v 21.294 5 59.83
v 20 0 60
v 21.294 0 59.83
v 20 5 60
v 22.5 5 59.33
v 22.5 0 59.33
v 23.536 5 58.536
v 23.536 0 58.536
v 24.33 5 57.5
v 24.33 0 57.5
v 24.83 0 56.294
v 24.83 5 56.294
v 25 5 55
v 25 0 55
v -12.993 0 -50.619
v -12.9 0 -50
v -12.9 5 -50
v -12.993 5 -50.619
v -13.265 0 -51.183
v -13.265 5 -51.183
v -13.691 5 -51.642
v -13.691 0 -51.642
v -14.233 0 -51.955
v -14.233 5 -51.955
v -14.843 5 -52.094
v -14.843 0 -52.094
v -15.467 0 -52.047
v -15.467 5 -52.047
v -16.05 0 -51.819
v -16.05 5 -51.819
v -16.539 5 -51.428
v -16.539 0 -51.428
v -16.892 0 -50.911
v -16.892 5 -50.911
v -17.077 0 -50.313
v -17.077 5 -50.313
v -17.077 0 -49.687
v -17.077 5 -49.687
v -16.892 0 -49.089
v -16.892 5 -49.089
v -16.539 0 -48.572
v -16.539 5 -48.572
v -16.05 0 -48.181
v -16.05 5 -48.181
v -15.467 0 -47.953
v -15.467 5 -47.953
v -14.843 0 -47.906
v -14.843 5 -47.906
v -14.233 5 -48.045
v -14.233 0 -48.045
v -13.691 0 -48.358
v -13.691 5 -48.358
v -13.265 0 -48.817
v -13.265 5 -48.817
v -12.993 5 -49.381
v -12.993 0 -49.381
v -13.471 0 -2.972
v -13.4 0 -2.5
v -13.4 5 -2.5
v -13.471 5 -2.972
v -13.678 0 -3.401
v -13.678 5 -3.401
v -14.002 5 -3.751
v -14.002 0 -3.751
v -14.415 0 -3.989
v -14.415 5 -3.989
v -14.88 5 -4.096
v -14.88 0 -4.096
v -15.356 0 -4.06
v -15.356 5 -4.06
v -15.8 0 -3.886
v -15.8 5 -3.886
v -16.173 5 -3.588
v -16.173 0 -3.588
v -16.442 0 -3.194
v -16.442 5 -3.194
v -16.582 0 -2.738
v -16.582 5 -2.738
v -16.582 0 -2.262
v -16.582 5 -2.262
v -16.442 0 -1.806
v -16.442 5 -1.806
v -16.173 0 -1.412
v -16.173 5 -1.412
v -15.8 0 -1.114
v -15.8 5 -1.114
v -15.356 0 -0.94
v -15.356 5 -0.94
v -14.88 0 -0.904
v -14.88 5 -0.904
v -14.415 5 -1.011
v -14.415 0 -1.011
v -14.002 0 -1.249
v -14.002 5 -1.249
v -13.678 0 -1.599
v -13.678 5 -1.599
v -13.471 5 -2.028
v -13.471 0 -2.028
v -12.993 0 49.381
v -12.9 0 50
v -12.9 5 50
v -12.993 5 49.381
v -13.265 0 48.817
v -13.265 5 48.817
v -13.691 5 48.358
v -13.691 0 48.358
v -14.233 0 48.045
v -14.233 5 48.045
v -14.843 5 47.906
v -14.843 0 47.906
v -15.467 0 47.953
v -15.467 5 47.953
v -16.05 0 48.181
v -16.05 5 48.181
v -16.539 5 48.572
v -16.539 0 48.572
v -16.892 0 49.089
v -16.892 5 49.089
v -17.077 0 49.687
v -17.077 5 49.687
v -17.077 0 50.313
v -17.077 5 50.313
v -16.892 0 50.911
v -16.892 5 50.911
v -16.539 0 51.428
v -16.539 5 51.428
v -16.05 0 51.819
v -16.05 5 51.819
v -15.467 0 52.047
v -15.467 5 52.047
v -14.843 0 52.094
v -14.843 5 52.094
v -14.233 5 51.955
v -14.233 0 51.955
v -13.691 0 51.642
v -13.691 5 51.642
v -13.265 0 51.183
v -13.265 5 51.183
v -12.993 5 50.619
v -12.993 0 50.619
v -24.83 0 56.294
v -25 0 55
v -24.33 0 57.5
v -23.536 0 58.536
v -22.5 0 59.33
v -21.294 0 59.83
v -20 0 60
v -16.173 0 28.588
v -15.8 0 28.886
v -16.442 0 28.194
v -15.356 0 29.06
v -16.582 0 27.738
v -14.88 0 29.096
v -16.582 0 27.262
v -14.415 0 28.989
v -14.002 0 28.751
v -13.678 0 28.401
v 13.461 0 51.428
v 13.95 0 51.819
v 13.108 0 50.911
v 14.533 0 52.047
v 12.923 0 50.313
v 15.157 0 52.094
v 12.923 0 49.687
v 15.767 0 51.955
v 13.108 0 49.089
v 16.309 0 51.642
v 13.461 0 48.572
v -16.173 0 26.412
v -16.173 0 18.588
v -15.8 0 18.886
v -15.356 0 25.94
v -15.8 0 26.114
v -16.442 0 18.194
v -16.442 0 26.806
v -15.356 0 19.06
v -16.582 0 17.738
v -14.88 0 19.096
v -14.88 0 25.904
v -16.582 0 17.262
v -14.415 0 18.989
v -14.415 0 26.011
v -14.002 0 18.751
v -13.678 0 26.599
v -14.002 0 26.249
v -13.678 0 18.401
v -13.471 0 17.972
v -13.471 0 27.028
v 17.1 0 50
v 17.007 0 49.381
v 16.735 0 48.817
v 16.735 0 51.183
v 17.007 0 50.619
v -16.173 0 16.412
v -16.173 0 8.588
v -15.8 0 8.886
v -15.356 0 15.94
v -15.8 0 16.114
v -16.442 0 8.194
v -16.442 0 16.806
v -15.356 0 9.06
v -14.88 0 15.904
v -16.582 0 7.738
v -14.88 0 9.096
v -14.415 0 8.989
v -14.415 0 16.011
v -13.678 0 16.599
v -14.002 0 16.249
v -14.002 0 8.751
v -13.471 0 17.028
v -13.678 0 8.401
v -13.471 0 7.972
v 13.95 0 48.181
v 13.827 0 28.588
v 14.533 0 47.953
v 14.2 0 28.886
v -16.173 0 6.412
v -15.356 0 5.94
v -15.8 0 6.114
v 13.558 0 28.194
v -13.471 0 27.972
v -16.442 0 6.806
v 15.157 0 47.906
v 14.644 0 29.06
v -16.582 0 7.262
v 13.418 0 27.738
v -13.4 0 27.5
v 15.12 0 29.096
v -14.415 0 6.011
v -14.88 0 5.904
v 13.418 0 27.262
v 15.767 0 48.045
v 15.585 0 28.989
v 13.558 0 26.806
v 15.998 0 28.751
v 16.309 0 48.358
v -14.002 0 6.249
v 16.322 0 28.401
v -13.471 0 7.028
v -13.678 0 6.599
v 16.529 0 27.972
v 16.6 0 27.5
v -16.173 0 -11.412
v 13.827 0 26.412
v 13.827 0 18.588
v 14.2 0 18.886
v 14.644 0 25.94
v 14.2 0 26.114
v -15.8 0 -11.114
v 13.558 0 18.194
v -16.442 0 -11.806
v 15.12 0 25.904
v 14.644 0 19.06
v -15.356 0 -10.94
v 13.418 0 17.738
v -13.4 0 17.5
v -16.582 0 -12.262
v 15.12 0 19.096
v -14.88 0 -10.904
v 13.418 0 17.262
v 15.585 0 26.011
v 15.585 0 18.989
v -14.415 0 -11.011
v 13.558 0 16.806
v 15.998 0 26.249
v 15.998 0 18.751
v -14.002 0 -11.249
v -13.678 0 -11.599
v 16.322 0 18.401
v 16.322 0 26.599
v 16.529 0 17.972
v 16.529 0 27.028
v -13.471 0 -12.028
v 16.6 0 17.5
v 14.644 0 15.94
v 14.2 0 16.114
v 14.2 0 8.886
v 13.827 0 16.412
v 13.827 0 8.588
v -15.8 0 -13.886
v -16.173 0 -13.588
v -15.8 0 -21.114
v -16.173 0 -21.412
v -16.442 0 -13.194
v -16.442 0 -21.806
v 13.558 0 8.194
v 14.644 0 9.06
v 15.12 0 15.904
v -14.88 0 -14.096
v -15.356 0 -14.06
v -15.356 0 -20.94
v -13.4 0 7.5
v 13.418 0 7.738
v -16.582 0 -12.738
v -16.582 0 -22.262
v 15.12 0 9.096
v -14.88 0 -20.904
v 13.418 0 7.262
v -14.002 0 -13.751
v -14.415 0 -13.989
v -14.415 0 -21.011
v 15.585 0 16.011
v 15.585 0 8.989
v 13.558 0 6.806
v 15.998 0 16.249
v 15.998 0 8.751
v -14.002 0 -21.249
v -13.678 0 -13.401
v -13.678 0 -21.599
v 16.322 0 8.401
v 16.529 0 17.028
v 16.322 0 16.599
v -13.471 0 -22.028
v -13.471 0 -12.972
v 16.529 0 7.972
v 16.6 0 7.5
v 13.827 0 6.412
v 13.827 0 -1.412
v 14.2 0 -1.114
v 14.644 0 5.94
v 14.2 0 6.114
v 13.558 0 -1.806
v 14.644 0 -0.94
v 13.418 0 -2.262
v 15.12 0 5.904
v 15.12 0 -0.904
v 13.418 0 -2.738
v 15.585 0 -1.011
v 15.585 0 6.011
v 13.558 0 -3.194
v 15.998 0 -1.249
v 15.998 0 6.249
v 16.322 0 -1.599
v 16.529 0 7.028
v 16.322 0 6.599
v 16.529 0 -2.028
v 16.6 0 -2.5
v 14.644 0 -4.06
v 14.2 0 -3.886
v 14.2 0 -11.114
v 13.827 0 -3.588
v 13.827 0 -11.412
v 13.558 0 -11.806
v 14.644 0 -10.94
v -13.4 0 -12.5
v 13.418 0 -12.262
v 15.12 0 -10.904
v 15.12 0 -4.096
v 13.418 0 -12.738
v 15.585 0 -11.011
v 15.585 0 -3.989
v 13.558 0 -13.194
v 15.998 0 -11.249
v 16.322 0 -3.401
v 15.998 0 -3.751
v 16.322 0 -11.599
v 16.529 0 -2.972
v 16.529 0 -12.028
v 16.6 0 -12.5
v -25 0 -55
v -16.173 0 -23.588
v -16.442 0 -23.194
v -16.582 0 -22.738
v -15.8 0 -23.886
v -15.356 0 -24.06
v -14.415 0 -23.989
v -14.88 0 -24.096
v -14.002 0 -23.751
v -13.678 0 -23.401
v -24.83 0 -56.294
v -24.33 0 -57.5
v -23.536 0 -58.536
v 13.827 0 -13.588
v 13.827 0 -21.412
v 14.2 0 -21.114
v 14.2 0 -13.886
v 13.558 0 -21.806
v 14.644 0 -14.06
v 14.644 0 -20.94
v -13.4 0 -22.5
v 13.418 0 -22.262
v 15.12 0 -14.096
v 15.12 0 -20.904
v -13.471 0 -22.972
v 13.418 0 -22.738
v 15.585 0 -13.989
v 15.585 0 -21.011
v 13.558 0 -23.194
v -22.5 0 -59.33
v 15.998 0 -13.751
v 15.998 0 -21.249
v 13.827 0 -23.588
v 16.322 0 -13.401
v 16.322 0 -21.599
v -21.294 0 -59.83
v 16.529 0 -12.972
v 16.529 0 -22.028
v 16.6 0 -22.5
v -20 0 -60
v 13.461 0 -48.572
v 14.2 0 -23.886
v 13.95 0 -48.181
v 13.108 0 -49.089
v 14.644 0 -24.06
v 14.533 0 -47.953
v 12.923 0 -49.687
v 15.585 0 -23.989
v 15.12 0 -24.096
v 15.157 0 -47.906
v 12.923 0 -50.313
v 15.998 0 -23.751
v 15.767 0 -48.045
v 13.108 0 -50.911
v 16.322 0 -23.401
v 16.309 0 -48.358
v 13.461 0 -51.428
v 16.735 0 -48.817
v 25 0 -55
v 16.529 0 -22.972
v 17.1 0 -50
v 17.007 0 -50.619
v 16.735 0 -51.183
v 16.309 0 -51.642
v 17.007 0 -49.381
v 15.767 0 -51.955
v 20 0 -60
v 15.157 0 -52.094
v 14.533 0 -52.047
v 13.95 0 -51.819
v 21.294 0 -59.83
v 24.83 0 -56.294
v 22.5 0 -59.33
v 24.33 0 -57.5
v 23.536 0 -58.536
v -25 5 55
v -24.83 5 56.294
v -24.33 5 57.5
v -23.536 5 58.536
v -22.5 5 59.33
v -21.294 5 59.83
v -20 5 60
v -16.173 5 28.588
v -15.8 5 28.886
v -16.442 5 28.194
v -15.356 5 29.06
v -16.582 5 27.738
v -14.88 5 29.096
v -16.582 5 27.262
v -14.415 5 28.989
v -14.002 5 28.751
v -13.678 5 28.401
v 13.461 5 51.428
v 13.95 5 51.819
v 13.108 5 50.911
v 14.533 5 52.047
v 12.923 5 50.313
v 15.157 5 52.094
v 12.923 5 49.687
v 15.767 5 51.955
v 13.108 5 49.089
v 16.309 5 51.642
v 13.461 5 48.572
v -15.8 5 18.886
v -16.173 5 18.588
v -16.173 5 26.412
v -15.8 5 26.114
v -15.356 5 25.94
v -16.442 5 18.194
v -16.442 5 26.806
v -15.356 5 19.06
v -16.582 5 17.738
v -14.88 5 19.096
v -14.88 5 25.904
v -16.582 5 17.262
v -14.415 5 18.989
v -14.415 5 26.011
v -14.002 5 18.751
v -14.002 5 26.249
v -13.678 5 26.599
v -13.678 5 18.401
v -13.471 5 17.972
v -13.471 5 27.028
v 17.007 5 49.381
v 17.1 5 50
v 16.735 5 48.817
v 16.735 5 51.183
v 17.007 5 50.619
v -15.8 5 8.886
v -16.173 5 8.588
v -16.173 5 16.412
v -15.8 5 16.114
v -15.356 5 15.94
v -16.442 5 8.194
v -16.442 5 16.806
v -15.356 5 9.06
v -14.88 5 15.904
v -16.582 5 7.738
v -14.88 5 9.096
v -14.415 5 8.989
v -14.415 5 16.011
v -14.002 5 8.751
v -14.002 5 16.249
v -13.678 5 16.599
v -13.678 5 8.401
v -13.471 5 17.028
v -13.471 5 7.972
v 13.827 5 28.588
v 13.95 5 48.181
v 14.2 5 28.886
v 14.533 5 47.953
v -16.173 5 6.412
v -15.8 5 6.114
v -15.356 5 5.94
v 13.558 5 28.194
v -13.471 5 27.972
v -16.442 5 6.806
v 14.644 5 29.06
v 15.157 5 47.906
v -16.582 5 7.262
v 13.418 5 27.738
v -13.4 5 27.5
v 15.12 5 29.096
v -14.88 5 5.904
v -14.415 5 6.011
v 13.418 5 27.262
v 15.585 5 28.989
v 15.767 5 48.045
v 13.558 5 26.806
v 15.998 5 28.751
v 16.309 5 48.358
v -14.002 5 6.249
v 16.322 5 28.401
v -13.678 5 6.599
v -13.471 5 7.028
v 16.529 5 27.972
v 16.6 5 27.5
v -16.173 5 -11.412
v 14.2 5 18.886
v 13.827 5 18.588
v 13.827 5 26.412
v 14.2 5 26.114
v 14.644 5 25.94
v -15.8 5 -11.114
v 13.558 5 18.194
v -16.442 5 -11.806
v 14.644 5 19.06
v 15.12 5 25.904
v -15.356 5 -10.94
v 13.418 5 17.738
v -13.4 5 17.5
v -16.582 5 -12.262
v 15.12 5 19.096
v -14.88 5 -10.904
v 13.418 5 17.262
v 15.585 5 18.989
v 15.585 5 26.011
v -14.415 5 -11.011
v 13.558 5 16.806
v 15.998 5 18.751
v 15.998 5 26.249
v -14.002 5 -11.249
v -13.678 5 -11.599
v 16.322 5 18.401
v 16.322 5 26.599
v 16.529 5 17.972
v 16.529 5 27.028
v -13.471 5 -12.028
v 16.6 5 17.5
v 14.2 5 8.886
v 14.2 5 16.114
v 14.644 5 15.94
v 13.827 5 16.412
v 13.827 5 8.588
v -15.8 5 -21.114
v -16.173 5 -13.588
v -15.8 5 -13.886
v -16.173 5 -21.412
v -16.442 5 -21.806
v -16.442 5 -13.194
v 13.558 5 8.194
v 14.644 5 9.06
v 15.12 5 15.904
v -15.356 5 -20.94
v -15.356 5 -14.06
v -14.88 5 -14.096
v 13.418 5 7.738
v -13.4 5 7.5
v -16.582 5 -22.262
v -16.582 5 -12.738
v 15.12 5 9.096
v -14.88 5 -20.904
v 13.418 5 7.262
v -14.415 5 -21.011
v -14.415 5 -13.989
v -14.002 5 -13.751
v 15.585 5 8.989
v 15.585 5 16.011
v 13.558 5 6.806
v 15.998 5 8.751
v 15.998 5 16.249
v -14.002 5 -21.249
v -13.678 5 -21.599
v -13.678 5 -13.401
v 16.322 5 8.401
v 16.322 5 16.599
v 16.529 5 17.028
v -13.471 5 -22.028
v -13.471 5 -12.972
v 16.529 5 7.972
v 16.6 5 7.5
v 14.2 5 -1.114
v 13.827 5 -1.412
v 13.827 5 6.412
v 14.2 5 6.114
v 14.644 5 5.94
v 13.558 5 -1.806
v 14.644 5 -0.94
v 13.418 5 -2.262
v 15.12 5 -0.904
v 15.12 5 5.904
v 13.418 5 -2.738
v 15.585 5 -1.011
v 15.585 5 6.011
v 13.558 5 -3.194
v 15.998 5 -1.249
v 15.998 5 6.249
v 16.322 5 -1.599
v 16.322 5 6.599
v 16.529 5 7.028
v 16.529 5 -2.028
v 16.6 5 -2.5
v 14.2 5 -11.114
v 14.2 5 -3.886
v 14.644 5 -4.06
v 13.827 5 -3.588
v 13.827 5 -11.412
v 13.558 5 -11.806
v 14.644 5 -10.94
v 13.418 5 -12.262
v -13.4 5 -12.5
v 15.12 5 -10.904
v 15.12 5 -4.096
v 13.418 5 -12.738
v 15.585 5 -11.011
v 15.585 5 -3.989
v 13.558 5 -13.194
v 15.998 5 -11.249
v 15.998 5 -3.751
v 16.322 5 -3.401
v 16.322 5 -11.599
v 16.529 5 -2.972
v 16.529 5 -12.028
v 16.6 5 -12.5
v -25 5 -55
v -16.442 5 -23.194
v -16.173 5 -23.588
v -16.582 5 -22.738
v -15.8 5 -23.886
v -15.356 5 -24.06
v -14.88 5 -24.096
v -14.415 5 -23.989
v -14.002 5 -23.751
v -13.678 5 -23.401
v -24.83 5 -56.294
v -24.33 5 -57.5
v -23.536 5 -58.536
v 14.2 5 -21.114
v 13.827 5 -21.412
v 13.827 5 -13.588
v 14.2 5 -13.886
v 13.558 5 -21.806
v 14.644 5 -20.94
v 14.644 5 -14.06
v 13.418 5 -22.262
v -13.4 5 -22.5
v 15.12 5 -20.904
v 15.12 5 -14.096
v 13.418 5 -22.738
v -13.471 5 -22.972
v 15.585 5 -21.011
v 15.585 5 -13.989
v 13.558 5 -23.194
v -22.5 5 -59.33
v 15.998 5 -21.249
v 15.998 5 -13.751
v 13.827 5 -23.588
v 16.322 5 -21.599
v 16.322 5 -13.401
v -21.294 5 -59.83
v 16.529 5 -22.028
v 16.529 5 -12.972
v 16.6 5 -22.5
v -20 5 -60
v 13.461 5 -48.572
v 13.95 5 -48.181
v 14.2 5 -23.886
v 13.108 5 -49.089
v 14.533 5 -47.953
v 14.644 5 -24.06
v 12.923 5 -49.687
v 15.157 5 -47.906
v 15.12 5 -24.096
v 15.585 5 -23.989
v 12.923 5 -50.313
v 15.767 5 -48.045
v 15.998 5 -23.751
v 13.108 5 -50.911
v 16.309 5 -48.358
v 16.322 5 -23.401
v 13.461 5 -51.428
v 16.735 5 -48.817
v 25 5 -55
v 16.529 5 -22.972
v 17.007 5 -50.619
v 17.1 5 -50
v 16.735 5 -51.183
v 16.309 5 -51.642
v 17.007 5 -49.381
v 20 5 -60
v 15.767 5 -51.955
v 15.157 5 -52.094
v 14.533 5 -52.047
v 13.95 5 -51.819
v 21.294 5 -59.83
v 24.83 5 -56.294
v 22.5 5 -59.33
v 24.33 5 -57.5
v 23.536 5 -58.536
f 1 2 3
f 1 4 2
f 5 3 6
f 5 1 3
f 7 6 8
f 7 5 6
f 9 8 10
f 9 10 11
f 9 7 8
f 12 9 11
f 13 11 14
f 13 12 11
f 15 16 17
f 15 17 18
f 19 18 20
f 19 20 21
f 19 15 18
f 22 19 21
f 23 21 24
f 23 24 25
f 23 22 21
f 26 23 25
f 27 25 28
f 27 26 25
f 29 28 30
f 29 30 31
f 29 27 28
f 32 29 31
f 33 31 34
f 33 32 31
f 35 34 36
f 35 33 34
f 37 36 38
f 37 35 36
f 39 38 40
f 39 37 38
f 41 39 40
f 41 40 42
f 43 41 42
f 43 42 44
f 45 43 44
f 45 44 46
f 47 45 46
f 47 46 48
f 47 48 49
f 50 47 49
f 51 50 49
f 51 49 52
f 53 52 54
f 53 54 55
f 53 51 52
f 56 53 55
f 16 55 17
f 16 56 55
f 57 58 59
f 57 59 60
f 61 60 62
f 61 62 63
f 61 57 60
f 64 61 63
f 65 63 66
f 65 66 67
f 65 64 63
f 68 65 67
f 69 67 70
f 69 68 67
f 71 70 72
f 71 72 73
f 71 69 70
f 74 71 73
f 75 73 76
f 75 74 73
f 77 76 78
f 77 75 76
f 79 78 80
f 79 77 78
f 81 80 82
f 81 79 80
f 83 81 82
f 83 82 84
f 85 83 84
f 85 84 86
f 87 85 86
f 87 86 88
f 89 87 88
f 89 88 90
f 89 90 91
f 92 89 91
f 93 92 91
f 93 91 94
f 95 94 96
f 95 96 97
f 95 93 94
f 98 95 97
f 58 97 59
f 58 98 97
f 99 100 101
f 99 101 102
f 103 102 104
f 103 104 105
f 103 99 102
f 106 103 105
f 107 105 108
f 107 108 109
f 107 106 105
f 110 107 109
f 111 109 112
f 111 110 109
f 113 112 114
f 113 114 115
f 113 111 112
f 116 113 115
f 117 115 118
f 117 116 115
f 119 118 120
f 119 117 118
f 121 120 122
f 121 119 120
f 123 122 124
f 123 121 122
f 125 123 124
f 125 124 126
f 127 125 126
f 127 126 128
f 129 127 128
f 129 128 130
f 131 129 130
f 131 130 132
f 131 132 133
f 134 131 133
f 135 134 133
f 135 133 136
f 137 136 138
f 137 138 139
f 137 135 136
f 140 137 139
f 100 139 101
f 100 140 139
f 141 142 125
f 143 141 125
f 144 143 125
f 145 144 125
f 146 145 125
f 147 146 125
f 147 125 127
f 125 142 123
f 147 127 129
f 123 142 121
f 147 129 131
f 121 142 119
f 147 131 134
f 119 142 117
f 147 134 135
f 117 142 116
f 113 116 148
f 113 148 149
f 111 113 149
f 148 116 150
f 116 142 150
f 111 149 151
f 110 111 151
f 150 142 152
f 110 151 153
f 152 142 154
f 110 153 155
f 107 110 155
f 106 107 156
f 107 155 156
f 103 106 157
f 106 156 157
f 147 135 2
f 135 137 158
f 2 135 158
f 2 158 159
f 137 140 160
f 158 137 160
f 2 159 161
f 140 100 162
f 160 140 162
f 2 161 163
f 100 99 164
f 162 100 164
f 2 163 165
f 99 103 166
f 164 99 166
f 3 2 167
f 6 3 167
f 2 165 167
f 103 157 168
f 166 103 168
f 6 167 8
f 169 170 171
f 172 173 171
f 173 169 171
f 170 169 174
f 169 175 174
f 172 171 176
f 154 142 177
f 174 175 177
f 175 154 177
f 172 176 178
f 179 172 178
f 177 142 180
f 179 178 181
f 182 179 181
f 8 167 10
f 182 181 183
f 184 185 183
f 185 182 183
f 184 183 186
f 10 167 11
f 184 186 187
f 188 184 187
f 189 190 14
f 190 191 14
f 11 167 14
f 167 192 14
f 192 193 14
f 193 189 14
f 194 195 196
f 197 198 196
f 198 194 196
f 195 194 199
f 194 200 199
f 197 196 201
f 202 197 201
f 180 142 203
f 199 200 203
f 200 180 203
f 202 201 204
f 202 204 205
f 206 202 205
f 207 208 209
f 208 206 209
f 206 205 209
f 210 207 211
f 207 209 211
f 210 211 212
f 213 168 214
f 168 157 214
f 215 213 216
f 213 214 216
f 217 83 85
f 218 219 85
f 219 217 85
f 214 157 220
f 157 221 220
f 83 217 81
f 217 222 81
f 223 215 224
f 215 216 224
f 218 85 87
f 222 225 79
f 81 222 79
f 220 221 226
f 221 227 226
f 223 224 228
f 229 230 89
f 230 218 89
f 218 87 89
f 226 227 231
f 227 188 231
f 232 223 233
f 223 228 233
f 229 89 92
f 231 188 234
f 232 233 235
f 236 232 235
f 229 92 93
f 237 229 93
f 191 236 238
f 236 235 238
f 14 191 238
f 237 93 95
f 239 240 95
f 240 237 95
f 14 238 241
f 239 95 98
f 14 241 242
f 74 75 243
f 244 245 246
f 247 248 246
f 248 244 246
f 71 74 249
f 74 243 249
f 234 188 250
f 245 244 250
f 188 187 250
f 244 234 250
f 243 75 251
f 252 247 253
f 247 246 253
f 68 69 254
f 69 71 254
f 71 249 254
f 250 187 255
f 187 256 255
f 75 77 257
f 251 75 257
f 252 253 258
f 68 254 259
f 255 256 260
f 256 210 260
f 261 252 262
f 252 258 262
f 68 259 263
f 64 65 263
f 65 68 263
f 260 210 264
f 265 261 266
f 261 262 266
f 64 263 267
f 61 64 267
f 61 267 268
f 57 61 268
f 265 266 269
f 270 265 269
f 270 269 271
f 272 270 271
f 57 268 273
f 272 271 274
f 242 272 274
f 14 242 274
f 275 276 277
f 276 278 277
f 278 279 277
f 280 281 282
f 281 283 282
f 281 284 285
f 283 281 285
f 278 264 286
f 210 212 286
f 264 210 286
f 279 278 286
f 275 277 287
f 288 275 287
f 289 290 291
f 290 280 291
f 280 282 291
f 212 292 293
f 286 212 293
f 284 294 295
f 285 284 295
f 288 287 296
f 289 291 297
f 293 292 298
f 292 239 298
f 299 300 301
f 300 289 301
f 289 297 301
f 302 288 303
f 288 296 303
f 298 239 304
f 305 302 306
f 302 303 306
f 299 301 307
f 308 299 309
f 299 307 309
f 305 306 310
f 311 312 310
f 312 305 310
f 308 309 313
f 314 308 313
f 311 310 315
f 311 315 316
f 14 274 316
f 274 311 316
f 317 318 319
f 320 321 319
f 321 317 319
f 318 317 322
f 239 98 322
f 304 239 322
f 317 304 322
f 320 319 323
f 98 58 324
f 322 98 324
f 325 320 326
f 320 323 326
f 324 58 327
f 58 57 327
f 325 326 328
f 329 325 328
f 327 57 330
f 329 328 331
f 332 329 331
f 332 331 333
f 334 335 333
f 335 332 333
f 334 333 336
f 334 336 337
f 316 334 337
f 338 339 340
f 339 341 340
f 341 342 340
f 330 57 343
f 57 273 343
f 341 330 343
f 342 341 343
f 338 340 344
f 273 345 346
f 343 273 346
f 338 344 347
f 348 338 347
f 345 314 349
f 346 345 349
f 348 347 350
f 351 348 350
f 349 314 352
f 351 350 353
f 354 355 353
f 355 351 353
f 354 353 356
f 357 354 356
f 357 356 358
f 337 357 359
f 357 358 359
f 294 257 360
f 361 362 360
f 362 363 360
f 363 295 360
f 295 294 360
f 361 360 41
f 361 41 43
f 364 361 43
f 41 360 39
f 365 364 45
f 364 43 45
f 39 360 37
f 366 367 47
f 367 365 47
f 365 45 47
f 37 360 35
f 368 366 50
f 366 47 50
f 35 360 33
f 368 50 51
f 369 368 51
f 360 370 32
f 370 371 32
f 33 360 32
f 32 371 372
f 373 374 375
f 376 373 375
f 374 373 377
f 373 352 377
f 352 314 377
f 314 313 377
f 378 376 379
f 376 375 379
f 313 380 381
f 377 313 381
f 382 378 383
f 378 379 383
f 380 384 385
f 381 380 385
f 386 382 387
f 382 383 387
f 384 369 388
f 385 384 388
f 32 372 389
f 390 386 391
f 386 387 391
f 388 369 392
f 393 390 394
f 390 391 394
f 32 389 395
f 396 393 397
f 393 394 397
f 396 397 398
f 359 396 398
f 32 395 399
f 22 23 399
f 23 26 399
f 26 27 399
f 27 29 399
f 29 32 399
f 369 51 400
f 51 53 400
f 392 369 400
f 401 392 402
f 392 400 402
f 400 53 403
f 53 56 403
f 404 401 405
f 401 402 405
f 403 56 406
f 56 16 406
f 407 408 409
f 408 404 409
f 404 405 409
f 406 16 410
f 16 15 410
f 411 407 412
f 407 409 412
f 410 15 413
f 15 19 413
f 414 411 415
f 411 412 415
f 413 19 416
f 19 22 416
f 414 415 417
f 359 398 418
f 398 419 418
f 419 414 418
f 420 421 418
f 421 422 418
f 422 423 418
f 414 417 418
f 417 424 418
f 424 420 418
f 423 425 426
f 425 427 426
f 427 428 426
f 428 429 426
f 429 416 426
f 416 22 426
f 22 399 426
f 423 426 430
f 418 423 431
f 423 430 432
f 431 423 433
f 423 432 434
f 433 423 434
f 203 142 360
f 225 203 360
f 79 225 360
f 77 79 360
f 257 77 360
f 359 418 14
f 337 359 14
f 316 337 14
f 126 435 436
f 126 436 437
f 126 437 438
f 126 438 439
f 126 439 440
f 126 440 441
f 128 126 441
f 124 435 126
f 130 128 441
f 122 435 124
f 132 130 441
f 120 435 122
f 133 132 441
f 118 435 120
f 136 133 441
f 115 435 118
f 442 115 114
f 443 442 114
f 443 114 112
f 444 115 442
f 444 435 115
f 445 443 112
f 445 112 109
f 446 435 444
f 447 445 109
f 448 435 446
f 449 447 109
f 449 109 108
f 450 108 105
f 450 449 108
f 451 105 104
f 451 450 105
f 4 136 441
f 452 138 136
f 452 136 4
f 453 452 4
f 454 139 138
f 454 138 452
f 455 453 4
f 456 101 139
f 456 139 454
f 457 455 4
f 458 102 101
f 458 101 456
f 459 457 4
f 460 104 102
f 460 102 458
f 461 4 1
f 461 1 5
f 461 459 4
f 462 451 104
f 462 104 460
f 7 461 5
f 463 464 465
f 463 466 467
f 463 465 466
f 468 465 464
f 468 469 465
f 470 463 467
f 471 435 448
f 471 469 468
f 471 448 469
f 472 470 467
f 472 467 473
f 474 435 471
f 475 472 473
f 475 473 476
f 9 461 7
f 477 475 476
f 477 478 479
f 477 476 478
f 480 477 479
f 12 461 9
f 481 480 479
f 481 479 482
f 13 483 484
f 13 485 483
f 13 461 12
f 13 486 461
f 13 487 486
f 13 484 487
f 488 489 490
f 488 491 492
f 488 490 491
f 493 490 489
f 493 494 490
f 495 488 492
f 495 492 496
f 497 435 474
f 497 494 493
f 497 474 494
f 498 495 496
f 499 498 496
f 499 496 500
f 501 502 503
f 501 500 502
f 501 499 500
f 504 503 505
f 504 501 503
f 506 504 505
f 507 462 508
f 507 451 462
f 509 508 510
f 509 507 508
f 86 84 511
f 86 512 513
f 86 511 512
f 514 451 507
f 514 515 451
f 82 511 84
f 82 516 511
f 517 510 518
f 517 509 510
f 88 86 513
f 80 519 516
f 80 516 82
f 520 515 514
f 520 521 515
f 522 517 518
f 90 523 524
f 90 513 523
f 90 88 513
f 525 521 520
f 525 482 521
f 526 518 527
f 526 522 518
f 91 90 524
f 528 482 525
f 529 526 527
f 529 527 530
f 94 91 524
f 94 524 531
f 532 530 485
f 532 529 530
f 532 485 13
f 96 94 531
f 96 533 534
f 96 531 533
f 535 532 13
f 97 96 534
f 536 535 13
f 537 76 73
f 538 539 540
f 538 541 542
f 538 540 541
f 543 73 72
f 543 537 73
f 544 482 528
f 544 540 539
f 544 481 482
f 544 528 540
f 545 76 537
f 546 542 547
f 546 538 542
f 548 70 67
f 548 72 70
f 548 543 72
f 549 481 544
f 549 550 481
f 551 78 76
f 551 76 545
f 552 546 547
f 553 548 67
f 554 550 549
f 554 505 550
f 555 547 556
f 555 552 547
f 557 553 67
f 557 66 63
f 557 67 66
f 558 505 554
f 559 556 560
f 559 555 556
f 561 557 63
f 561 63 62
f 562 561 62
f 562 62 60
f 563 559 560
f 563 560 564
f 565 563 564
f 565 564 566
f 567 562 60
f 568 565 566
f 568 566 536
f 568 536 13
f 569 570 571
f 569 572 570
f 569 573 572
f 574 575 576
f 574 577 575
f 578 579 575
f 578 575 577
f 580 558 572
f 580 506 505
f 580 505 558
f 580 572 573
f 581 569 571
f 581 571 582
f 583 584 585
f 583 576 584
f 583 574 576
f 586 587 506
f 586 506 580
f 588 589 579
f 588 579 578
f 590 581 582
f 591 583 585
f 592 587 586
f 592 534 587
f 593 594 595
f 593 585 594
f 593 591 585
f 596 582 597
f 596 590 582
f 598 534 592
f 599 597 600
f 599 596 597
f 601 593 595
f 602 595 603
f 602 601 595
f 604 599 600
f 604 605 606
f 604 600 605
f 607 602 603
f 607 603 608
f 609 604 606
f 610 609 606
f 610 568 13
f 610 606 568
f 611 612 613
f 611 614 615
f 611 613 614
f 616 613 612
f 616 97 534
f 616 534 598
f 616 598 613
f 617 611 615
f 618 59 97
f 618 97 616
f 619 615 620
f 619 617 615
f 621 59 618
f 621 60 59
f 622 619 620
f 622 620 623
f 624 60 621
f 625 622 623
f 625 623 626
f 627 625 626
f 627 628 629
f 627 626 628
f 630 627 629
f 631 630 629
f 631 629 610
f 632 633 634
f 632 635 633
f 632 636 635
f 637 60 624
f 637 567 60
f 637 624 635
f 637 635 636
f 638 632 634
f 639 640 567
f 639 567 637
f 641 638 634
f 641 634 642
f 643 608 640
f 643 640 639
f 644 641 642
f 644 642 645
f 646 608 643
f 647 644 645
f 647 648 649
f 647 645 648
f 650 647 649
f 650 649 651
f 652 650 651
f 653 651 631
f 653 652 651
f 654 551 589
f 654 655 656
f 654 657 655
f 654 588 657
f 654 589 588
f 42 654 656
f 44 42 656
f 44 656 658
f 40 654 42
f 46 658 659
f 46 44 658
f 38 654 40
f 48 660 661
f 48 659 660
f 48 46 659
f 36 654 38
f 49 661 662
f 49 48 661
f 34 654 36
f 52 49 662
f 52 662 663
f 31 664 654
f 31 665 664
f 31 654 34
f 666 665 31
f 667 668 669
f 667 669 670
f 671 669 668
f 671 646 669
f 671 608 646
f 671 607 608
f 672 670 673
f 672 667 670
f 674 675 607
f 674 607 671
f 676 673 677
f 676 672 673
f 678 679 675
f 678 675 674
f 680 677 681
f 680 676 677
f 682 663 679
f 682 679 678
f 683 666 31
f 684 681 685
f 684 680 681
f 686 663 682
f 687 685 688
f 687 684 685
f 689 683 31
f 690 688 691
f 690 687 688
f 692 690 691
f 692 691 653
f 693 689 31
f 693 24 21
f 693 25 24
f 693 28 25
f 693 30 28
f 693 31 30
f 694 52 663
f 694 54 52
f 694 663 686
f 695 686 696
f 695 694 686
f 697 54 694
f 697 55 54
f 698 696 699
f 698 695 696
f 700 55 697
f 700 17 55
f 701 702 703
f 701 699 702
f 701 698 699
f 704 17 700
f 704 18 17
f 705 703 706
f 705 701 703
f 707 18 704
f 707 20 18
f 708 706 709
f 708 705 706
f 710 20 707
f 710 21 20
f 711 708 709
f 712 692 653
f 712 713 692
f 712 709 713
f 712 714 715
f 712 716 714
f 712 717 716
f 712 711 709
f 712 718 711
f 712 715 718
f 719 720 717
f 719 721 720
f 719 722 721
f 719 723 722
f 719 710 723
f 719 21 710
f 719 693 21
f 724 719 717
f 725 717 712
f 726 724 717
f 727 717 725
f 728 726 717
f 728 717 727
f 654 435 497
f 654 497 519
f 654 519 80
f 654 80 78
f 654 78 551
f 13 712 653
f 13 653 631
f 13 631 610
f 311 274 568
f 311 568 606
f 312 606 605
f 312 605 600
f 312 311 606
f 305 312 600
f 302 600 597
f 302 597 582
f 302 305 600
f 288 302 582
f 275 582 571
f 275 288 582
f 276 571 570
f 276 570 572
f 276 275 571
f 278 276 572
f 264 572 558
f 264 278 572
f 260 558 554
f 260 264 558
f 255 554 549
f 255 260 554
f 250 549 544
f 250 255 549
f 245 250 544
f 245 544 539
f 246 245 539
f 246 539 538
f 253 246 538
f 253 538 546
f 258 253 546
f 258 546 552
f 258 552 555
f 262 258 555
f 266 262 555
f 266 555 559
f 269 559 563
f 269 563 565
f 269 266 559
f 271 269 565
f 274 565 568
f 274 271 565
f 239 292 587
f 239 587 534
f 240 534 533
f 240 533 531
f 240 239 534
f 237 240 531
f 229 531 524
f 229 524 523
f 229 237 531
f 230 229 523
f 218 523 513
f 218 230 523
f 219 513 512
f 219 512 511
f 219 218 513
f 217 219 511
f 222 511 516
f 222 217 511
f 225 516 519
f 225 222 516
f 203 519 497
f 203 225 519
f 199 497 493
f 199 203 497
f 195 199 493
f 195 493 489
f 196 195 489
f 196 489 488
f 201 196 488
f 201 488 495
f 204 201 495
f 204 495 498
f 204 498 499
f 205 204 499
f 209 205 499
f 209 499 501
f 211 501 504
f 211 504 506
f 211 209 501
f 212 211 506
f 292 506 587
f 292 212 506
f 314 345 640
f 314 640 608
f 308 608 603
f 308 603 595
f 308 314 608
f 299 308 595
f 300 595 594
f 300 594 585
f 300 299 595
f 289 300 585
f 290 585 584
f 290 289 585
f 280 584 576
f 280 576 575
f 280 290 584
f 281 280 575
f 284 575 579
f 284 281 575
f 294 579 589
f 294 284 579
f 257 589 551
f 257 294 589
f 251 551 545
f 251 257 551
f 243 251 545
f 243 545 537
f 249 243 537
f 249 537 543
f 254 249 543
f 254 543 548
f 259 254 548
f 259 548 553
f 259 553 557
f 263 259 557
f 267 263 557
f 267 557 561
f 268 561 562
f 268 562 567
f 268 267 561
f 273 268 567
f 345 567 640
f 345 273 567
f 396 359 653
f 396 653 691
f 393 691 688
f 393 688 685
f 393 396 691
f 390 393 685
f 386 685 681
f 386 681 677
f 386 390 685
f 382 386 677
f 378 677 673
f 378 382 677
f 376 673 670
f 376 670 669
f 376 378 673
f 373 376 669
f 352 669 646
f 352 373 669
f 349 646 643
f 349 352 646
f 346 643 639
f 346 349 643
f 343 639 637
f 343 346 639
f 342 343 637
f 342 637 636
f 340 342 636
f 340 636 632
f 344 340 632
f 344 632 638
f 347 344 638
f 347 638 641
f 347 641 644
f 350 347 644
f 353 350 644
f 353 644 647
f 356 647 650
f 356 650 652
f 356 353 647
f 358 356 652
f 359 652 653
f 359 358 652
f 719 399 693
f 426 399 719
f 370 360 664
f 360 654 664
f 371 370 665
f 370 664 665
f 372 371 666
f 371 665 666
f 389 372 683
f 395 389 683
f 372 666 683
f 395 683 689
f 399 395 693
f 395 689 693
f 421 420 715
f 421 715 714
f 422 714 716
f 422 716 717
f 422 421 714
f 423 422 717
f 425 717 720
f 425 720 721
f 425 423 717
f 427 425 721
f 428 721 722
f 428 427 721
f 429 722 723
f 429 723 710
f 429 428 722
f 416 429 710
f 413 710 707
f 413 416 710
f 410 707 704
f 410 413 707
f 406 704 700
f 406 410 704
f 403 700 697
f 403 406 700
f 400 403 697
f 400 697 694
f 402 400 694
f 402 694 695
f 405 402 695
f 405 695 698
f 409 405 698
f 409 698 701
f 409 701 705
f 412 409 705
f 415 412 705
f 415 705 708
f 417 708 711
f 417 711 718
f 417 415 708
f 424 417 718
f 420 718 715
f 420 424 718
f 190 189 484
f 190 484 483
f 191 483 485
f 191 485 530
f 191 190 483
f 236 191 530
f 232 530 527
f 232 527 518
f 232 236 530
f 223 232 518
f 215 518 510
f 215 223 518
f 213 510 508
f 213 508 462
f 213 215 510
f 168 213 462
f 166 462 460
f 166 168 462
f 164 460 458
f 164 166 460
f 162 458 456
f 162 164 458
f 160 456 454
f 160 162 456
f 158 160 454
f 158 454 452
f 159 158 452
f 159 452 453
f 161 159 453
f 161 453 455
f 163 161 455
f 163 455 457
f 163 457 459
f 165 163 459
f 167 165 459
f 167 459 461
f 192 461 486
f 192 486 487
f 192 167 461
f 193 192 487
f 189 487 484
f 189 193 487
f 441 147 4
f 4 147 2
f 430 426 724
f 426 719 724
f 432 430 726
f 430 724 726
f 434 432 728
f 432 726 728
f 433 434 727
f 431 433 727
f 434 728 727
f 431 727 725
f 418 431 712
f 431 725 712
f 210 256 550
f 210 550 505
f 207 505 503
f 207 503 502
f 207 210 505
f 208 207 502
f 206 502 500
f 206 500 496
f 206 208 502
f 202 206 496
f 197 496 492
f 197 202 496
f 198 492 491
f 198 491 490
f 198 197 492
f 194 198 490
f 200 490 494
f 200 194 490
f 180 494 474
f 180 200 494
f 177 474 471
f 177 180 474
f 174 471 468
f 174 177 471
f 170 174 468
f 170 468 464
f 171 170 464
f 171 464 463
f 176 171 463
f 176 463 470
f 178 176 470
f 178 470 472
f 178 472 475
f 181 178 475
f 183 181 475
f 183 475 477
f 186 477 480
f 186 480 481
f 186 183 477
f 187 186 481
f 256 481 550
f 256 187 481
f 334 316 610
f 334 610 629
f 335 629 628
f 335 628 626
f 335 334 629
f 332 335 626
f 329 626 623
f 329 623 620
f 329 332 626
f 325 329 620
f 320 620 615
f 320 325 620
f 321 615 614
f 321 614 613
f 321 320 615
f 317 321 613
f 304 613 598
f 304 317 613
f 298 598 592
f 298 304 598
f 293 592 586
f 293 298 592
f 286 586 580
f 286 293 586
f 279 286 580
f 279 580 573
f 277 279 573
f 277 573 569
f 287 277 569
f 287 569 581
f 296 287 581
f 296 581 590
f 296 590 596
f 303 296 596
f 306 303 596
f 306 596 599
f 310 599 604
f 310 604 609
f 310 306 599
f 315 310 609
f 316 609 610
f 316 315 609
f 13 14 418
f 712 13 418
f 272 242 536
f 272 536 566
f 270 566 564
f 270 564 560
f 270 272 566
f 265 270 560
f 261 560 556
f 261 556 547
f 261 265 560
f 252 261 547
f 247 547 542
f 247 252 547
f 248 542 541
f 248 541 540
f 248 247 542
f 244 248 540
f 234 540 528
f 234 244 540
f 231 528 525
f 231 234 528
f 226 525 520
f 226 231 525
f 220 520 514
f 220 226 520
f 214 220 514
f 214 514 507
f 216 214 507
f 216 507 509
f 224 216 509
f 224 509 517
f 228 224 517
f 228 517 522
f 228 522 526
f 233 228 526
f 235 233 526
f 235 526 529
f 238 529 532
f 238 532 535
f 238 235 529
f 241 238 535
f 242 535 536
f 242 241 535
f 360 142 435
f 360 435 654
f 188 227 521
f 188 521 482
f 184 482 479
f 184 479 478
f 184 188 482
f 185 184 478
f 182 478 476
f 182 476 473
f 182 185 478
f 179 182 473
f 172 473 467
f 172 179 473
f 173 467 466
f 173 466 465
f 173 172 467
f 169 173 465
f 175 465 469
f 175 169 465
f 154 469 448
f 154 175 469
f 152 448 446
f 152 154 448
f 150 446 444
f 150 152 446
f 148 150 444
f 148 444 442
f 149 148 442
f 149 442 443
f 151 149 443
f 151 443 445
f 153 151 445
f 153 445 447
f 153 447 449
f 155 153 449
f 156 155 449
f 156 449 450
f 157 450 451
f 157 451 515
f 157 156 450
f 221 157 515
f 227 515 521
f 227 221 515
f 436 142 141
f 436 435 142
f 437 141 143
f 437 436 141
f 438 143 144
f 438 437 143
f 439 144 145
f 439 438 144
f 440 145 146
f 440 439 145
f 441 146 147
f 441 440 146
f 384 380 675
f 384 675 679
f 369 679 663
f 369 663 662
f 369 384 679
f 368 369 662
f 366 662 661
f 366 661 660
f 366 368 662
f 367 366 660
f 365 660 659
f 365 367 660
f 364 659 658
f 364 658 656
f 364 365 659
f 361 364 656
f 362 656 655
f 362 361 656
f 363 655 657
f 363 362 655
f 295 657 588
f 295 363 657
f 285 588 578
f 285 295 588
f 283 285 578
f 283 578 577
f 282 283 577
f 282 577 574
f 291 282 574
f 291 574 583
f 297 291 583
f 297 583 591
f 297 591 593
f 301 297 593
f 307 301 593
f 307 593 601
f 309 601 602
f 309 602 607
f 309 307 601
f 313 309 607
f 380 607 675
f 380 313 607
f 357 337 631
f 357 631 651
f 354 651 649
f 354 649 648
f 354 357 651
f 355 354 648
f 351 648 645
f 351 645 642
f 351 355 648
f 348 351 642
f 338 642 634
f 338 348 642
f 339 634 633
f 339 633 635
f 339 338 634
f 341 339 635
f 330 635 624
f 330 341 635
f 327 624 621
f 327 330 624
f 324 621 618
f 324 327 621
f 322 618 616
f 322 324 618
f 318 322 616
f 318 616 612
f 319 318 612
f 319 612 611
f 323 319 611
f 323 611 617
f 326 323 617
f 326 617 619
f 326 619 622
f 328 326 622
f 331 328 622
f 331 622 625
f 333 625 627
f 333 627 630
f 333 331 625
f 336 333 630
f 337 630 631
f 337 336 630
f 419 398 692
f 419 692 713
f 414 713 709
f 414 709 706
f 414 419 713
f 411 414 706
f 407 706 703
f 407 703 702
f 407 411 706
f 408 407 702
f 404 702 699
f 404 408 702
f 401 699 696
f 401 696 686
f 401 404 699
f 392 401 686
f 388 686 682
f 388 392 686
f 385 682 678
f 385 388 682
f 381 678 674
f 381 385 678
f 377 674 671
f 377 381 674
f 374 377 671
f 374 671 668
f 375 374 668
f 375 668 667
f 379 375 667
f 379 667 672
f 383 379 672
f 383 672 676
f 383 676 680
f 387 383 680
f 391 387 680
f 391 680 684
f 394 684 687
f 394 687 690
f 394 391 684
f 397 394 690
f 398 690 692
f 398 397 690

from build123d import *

# Parameters (mm, degrees)
SKETCH1_W           = 50
SKETCH1_H           = 120
SKETCH1_R           = 2.1
SKETCH1_R_2         = 1.6
BOSS_EXTRUDE1_DEPTH = 5
FILLET2_R           = 5


with BuildPart() as part:
    # Sketch1 → Boss-Extrude1 (new body)
    with BuildSketch(Plane(origin=(0, 0, 0), x_dir=(1, 0, 0), z_dir=(0, 1, 0))):
        Rectangle(SKETCH1_W, SKETCH1_H)
        with Locations((-15, 50)):
            Circle(SKETCH1_R, mode=Mode.SUBTRACT)
        with Locations((15, 50)):
            Circle(SKETCH1_R, mode=Mode.SUBTRACT)
        with Locations((15, 22.5)):
            Circle(SKETCH1_R_2, mode=Mode.SUBTRACT)
        with Locations((-15, -27.5)):
            Circle(SKETCH1_R_2, mode=Mode.SUBTRACT)
        with Locations((-15, -17.5)):
            Circle(SKETCH1_R_2, mode=Mode.SUBTRACT)
        with Locations((-15, -7.5)):
            Circle(SKETCH1_R_2, mode=Mode.SUBTRACT)
        with Locations((15, -27.5)):
            Circle(SKETCH1_R_2, mode=Mode.SUBTRACT)
        with Locations((15, -17.5)):
            Circle(SKETCH1_R_2, mode=Mode.SUBTRACT)
        with Locations((15, -7.5)):
            Circle(SKETCH1_R_2, mode=Mode.SUBTRACT)
        with Locations((-15, 2.5)):
            Circle(SKETCH1_R_2, mode=Mode.SUBTRACT)
        with Locations((-15, 12.5)):
            Circle(SKETCH1_R_2, mode=Mode.SUBTRACT)
        with Locations((-15, 22.5)):
            Circle(SKETCH1_R_2, mode=Mode.SUBTRACT)
        with Locations((15, 2.5)):
            Circle(SKETCH1_R_2, mode=Mode.SUBTRACT)
        with Locations((15, 12.5)):
            Circle(SKETCH1_R_2, mode=Mode.SUBTRACT)
        with Locations((15, -50)):
            Circle(SKETCH1_R, mode=Mode.SUBTRACT)
        with Locations((-15, -50)):
            Circle(SKETCH1_R, mode=Mode.SUBTRACT)
    extrude(amount=BOSS_EXTRUDE1_DEPTH)

    # Fillet2
    fillet2_edges = [part.edges().sort_by_distance(p)[0] for p in [
        (25, 2.5, 60),
        (-25, 2.5, 60),
        (-25, 2.5, -60),
        (25, 2.5, -60),
    ]]
    fillet(fillet2_edges, radius=FILLET2_R)


solid = part.part
